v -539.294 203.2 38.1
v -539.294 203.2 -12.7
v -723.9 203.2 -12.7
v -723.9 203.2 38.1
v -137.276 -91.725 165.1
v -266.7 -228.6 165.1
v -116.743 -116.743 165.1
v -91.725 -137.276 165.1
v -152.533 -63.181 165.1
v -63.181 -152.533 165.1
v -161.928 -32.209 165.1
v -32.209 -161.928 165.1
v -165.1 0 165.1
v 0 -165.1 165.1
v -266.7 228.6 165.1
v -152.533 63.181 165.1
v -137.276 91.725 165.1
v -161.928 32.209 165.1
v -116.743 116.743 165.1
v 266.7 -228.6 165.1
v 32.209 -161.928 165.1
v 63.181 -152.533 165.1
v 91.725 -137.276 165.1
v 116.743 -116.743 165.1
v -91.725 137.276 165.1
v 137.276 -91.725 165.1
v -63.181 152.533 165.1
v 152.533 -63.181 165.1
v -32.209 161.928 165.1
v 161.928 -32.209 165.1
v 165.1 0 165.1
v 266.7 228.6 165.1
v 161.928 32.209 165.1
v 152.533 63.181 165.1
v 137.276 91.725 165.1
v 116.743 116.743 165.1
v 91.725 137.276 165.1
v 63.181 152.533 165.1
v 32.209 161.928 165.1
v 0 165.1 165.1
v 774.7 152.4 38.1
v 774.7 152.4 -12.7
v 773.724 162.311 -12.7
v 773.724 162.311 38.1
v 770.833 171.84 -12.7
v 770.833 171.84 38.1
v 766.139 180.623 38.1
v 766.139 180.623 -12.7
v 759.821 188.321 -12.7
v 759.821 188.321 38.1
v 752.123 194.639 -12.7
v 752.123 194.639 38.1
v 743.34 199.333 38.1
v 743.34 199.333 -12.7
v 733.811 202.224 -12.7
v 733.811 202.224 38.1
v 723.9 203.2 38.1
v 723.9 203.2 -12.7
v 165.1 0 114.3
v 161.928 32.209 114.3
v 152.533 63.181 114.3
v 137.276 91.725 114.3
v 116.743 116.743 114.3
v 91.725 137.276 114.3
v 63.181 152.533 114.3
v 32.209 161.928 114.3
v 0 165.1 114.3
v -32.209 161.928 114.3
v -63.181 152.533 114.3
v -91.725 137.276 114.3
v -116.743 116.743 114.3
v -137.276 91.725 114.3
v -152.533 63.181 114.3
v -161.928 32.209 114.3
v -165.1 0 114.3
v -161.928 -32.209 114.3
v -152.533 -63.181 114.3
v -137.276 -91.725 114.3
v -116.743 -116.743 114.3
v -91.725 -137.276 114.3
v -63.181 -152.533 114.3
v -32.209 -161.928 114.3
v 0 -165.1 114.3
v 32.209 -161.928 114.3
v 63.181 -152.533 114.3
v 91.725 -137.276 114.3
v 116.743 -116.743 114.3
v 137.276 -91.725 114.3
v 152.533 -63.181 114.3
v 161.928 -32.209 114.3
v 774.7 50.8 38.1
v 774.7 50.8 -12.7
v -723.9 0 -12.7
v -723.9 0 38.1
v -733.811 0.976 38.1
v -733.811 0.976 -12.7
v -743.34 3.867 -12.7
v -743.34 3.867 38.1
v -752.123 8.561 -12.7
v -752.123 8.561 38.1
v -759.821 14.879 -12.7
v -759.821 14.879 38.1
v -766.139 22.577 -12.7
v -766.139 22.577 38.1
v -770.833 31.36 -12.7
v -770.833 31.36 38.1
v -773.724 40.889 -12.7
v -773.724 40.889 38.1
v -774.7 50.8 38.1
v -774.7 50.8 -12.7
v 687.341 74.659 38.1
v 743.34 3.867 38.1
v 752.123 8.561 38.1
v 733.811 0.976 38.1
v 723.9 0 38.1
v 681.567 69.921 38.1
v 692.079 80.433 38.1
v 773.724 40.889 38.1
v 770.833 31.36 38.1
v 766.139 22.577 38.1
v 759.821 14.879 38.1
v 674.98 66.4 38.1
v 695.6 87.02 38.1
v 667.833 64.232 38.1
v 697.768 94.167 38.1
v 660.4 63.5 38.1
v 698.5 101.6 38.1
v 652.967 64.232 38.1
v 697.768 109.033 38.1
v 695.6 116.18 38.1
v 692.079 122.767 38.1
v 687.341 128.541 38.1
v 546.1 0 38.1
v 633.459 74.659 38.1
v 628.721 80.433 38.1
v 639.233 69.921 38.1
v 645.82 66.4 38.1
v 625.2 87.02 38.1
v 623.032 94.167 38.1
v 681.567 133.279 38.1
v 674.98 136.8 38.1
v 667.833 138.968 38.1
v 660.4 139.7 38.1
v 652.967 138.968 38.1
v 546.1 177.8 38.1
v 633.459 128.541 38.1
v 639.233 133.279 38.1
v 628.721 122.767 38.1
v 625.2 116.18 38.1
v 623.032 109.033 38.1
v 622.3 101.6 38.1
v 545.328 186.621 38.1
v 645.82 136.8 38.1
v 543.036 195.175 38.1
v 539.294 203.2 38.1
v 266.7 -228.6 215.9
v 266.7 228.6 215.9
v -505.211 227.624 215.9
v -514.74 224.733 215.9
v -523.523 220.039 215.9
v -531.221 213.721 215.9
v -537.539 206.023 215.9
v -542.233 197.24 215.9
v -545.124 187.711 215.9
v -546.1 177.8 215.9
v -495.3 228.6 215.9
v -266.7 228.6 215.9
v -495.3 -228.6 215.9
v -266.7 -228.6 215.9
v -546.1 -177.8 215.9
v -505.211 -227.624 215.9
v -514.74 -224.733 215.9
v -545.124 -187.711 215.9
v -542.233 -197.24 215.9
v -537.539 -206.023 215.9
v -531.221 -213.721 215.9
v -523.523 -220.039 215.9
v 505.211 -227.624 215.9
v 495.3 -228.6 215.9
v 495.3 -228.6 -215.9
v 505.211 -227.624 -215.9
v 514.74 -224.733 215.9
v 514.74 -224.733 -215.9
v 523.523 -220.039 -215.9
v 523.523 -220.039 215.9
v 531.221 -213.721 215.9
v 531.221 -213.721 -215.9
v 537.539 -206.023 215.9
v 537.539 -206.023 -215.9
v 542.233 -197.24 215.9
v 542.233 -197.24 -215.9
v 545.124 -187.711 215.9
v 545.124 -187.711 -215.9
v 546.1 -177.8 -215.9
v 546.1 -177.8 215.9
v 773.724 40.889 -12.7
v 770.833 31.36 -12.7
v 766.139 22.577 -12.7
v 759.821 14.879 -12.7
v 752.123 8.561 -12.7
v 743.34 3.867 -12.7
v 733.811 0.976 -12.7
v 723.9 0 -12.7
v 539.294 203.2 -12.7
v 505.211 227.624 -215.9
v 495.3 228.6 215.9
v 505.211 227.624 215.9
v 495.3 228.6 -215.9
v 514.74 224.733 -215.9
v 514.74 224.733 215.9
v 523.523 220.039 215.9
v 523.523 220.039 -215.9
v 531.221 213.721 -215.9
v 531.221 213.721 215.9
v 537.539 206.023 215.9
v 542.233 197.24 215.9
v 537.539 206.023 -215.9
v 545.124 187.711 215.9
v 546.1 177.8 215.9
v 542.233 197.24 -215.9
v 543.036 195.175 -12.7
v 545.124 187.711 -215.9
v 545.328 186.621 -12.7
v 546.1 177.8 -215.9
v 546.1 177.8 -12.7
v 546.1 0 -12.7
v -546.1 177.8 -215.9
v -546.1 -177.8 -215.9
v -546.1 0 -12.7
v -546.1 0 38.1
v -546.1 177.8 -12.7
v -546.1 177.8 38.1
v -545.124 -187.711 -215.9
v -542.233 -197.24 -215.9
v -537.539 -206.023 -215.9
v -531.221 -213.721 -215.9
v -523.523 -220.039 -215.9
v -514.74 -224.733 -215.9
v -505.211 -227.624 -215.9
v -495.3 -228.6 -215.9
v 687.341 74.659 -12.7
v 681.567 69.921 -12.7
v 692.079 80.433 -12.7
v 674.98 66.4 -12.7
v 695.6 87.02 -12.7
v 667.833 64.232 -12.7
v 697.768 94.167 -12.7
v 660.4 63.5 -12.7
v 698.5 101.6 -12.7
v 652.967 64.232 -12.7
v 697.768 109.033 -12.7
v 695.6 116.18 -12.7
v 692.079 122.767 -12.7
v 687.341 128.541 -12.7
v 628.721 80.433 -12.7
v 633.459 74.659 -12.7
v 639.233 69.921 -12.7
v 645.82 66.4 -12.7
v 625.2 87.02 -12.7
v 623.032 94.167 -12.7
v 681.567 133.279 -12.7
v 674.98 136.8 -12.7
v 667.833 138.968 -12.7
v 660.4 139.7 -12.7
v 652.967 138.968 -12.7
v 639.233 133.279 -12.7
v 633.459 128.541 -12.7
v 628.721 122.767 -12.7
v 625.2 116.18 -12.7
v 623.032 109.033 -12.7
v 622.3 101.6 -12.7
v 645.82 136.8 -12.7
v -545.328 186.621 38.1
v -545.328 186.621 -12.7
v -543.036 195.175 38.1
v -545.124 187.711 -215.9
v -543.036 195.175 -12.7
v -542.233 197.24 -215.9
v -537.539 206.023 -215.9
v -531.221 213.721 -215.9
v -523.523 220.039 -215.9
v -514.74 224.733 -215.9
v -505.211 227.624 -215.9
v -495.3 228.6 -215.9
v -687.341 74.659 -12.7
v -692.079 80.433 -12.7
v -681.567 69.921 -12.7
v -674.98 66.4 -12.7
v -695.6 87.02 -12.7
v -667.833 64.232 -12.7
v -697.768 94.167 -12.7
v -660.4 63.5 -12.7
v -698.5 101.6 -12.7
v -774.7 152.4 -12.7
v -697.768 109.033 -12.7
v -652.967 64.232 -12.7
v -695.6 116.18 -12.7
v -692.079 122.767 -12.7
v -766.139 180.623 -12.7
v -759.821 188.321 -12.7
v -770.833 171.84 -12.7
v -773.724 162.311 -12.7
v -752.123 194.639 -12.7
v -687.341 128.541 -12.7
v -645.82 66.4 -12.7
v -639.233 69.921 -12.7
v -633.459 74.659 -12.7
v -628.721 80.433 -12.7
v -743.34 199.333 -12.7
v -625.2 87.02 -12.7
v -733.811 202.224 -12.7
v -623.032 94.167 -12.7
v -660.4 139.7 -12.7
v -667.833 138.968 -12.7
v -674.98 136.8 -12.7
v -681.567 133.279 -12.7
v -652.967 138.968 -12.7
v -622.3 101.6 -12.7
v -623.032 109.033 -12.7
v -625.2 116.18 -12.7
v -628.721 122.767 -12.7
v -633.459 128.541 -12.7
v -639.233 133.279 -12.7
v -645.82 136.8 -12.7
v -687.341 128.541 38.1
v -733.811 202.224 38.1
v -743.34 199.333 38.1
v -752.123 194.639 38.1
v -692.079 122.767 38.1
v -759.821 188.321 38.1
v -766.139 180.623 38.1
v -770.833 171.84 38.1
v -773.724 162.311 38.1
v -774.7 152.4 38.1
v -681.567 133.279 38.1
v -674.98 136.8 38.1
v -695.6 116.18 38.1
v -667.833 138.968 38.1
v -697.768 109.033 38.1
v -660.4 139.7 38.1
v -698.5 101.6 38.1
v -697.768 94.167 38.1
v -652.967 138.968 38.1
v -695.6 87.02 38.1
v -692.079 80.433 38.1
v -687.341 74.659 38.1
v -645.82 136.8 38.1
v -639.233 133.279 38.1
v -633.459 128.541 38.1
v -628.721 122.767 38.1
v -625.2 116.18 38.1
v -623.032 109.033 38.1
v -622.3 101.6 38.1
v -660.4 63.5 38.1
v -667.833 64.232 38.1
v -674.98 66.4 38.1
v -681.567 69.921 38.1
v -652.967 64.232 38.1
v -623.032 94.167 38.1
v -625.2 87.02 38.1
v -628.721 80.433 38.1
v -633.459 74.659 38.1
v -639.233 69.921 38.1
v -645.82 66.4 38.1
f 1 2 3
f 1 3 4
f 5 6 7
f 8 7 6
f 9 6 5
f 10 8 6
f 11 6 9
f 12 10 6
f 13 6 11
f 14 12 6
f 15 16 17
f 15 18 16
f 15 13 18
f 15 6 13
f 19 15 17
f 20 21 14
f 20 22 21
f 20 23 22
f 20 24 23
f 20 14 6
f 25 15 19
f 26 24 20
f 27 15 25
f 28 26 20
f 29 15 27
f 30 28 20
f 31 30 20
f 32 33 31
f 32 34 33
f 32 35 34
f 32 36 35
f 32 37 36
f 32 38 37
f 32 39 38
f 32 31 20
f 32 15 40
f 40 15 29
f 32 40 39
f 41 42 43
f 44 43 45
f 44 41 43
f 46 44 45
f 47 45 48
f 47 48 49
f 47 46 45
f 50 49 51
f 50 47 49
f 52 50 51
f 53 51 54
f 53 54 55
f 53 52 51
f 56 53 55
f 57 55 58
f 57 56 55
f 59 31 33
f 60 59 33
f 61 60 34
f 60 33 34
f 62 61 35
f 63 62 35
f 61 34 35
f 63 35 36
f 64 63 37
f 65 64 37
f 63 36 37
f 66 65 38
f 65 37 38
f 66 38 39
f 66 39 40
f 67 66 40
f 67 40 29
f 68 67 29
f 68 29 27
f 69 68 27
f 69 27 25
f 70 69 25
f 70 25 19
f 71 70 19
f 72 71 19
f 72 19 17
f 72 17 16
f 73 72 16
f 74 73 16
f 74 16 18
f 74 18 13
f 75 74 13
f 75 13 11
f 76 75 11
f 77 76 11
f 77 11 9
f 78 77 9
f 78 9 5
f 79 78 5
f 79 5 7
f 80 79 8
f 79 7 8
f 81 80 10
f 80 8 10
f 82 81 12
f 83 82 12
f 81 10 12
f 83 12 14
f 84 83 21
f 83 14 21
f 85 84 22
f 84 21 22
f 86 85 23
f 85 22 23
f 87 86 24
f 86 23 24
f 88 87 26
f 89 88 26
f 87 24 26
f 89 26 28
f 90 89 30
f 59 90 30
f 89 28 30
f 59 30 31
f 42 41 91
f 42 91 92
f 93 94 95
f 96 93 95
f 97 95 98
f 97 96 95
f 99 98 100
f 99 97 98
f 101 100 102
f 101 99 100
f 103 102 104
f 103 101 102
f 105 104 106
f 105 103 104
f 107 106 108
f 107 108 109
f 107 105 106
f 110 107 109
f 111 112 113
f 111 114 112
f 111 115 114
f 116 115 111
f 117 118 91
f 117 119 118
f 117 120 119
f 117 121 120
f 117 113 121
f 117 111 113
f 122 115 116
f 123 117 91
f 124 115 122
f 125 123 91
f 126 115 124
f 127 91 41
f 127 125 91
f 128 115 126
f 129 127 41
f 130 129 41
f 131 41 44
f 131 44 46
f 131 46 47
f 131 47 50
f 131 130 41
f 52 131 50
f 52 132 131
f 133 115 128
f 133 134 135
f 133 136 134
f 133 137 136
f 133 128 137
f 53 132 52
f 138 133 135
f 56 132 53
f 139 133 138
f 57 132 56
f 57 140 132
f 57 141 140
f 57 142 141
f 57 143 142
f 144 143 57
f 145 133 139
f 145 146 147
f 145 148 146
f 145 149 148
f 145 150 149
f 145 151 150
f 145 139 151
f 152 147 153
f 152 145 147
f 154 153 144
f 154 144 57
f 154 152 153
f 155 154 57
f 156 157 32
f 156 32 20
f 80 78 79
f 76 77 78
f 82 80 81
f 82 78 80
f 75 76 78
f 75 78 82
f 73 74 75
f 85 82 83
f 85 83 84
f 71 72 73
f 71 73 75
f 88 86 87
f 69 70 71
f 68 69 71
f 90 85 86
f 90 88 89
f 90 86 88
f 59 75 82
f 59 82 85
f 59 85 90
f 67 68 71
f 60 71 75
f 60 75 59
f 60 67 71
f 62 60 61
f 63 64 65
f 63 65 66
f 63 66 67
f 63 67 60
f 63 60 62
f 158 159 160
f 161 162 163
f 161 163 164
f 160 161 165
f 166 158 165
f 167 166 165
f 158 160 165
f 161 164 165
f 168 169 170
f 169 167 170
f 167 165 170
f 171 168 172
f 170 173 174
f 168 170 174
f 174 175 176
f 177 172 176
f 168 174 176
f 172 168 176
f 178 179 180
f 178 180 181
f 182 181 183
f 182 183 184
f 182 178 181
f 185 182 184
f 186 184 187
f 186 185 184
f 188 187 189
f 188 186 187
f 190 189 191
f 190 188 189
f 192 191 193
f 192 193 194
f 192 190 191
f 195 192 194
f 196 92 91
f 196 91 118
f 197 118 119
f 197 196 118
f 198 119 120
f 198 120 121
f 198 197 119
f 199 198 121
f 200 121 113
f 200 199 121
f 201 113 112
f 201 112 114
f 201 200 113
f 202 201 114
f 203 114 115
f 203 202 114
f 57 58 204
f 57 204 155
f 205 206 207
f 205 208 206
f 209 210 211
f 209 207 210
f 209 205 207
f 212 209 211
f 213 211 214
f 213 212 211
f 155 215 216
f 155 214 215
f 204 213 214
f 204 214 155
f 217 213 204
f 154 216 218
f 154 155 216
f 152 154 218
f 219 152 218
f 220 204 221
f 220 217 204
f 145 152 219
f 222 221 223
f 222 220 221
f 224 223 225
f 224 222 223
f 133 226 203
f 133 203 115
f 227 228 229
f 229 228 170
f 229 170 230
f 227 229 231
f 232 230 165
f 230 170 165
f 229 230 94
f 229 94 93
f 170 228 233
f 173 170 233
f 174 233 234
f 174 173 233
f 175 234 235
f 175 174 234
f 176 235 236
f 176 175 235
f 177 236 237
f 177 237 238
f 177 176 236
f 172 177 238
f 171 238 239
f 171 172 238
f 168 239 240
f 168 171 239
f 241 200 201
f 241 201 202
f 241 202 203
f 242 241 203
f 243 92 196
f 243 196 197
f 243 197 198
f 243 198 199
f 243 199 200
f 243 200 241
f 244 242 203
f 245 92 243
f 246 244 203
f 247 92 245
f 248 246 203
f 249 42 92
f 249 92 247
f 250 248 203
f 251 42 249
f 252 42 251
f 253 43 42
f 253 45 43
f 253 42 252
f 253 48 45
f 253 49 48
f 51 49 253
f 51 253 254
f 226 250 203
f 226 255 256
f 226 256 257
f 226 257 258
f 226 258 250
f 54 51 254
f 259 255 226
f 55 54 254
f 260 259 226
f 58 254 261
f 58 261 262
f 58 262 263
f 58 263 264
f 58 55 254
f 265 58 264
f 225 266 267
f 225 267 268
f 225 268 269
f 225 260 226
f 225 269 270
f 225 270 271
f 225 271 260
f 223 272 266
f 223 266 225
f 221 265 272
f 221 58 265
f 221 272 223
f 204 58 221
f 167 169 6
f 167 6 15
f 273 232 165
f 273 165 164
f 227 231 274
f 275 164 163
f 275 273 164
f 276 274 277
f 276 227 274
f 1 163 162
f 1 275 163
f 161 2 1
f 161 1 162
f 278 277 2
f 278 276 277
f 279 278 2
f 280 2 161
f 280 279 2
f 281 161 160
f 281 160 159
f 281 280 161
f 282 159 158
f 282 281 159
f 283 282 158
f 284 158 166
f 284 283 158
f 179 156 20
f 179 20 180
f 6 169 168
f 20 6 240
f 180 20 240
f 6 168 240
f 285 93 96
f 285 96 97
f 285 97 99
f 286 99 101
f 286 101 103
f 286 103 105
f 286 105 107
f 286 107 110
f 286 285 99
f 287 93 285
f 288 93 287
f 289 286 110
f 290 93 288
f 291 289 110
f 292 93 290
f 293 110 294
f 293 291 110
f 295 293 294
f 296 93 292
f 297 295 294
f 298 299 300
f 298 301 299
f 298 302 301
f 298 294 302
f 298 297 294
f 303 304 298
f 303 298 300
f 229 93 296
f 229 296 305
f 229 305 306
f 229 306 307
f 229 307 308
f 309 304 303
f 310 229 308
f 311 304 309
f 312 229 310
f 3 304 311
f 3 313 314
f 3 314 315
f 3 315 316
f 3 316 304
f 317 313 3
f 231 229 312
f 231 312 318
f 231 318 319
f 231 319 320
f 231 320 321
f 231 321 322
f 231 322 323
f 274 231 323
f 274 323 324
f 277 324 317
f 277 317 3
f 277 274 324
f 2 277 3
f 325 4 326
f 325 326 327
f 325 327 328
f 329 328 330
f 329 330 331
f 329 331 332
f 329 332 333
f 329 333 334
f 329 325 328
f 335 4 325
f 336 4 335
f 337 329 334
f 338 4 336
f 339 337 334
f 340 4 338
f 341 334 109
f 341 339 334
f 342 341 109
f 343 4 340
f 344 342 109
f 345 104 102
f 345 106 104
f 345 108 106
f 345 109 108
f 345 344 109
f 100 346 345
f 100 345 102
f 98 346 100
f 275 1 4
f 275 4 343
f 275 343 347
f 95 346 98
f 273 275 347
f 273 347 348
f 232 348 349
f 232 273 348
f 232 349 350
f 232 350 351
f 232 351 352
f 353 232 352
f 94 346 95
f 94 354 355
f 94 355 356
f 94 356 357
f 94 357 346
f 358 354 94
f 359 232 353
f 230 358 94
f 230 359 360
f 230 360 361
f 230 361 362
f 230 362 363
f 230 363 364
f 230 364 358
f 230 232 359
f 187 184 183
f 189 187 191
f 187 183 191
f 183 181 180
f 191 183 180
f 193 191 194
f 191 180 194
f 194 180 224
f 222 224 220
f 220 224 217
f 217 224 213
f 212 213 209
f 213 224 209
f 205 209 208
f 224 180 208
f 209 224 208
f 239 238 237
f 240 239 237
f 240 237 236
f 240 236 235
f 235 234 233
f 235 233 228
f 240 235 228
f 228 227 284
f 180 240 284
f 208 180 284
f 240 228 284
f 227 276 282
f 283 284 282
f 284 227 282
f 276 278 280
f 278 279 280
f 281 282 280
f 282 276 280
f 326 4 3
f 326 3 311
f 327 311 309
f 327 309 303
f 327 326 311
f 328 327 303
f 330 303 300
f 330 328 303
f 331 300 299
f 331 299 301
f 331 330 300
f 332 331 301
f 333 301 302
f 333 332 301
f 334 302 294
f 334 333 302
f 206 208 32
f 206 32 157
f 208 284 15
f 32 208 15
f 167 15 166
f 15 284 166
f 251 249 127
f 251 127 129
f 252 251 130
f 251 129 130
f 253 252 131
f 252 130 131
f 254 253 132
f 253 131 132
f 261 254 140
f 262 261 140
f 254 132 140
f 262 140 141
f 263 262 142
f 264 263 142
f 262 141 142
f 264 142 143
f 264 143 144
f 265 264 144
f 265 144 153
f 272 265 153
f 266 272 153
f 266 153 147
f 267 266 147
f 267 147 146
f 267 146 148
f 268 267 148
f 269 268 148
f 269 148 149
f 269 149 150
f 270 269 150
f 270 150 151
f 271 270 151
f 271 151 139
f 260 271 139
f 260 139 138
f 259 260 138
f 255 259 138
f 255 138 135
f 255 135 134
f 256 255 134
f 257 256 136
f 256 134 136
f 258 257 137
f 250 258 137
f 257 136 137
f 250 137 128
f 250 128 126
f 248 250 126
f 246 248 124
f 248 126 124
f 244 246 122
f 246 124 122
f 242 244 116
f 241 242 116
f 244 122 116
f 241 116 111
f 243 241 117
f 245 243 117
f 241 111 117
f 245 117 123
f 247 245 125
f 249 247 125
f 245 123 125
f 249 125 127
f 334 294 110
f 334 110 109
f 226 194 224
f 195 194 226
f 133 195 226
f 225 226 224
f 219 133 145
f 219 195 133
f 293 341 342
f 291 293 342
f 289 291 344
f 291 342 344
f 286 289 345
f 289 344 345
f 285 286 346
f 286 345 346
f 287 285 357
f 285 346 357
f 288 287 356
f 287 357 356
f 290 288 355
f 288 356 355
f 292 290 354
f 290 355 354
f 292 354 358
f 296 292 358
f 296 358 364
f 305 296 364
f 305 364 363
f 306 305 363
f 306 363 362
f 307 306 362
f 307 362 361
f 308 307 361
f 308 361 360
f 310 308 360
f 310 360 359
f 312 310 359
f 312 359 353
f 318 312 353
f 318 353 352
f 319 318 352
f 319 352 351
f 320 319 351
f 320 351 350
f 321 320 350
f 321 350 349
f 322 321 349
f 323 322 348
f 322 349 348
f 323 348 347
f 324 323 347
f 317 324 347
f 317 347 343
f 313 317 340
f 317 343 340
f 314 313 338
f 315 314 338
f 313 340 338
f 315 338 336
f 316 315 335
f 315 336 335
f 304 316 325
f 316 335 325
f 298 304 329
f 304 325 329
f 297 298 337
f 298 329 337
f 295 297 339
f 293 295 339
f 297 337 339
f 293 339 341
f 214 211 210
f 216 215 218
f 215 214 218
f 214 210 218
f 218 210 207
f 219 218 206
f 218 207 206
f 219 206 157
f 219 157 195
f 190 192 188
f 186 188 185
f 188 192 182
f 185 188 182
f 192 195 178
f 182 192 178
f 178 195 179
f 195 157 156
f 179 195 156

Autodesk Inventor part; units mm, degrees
ref_plane "YZ Plane" through (0, 0, 0) normal (1, 0, 0) x (0, 1, 0)
ref_plane "XZ Plane" through (0, 0, 0) normal (0, 1, 0) x (-1, 0, 0)
ref_plane "XY Plane" through (0, 0, 0) normal (0, 0, 1) x (1, 0, 0)
sketch "Sketch1" plane through (0, 0, 0) normal (1, 0, 0) x (0, 1, 0)
  line L0 (228.6, 215.9) -> (-228.6, 215.9)
  line L1 (-228.6, 215.9) -> (-228.6, -215.9)
  line L2 (-228.6, -215.9) -> (228.6, -215.9)
  line L3 (228.6, -215.9) -> (228.6, 215.9)
  point P0 (0, 0)
  dimension "d0" = 431.8
  dimension "d1" = 457.2
  dimension "d2" = 215.9
  dimension "d3" = 228.6
extrude "Extrusion1" add sketch "Sketch1" along normal mid plane 1092.2
sketch "Sketch2" plane through (546.1, 0, 0) normal (1, 0, 0) x (0, 0, -1)
  line L0 (-38.1, 203.2) -> (12.7, 203.2)
  line L1 (12.7, 203.2) -> (12.7, 0)
  line L2 (12.7, 0) -> (-38.1, 0)
  line L3 (-38.1, 0) -> (-38.1, 203.2)
  line L4 (-215.9, 228.6) -> (-215.9, -228.6) projected
  line L5 (-215.9, 228.6) -> (215.9, 228.6) projected
  point P0 (0, 0)
  dimension "d6" = 50.8
  dimension "d7" = 203.2
  dimension "d8" = 228.6
  dimension "d9" = 25.4
extrude "Extrusion2" add sketch "Sketch2" along normal blind 228.6
mirror "Mirror1" about plane through (0, 0, 0) normal (1, 0, 0) of "Extrusion2"
sketch "Sketch3" plane through (546.1, 0, 38.1) normal (0, 0, 1) x (1, 0, 0)
  circle A0 centre (114.3, 101.6) radius 38.1
  line L0 (0, 228.6) -> (0, -228.6) projected
  line L1 (0, 203.2) -> (228.6, 203.2) projected
  point P0 (-546.1, 0)
  dimension "d12" = 76.2
  dimension "d13" = 114.3
  dimension "d14" = 101.6
extrude "Extrusion3" cut sketch "Sketch3" against normal through all
mirror "Mirror2" about plane through (0, 0, 0) normal (1, 0, 0) of "Extrusion3"
fillet "Fillet1" radius 50.8 8 edges at (774.7, 203.2, 12.7) (774.7, 0, 12.7) (546.1, 228.6, 0) (546.1, -228.6, 0) (-546.1, 228.6, 0) (-546.1, -228.6, 0) (-774.7, 203.2, 12.7) (-774.7, 0, 12.7)
sketch "Sketch4" plane through (-495.3, -228.6, 215.9) normal (0, 0, 1) x (1, 0, 0)
  circle A0 centre (495.3, 228.6) radius 165.1
  dimension "d18" = 330.2
extrude "Extrusion4" cut sketch "Sketch4" against normal blind 101.6
sketch "Sketch5" plane through (-495.3, -228.6, 215.9) normal (0, 0, 1) x (1, 0, 0)
  line L0 (990.6, 457.2) -> (0, 457.2) projected
  line L1 (0, 0) -> (990.6, 0) projected
  line L2 (228.6, 457.2) -> (762, 457.2)
  line L3 (762, 457.2) -> (762, 0)
  line L4 (762, 0) -> (228.6, 0)
  line L5 (228.6, 0) -> (228.6, 457.2)
  line L6 (1041.4, 406.4) -> (1041.4, 50.8) projected
  line L7 (-50.8, 50.8) -> (-50.8, 406.4) projected
  point P0 (495.3, 228.6)
  dimension "d21" = 279.4
  dimension "d22" = 279.4
extrude "Extrusion5" cut sketch "Sketch5" against normal blind 50.8
properties part number "Speaker"
